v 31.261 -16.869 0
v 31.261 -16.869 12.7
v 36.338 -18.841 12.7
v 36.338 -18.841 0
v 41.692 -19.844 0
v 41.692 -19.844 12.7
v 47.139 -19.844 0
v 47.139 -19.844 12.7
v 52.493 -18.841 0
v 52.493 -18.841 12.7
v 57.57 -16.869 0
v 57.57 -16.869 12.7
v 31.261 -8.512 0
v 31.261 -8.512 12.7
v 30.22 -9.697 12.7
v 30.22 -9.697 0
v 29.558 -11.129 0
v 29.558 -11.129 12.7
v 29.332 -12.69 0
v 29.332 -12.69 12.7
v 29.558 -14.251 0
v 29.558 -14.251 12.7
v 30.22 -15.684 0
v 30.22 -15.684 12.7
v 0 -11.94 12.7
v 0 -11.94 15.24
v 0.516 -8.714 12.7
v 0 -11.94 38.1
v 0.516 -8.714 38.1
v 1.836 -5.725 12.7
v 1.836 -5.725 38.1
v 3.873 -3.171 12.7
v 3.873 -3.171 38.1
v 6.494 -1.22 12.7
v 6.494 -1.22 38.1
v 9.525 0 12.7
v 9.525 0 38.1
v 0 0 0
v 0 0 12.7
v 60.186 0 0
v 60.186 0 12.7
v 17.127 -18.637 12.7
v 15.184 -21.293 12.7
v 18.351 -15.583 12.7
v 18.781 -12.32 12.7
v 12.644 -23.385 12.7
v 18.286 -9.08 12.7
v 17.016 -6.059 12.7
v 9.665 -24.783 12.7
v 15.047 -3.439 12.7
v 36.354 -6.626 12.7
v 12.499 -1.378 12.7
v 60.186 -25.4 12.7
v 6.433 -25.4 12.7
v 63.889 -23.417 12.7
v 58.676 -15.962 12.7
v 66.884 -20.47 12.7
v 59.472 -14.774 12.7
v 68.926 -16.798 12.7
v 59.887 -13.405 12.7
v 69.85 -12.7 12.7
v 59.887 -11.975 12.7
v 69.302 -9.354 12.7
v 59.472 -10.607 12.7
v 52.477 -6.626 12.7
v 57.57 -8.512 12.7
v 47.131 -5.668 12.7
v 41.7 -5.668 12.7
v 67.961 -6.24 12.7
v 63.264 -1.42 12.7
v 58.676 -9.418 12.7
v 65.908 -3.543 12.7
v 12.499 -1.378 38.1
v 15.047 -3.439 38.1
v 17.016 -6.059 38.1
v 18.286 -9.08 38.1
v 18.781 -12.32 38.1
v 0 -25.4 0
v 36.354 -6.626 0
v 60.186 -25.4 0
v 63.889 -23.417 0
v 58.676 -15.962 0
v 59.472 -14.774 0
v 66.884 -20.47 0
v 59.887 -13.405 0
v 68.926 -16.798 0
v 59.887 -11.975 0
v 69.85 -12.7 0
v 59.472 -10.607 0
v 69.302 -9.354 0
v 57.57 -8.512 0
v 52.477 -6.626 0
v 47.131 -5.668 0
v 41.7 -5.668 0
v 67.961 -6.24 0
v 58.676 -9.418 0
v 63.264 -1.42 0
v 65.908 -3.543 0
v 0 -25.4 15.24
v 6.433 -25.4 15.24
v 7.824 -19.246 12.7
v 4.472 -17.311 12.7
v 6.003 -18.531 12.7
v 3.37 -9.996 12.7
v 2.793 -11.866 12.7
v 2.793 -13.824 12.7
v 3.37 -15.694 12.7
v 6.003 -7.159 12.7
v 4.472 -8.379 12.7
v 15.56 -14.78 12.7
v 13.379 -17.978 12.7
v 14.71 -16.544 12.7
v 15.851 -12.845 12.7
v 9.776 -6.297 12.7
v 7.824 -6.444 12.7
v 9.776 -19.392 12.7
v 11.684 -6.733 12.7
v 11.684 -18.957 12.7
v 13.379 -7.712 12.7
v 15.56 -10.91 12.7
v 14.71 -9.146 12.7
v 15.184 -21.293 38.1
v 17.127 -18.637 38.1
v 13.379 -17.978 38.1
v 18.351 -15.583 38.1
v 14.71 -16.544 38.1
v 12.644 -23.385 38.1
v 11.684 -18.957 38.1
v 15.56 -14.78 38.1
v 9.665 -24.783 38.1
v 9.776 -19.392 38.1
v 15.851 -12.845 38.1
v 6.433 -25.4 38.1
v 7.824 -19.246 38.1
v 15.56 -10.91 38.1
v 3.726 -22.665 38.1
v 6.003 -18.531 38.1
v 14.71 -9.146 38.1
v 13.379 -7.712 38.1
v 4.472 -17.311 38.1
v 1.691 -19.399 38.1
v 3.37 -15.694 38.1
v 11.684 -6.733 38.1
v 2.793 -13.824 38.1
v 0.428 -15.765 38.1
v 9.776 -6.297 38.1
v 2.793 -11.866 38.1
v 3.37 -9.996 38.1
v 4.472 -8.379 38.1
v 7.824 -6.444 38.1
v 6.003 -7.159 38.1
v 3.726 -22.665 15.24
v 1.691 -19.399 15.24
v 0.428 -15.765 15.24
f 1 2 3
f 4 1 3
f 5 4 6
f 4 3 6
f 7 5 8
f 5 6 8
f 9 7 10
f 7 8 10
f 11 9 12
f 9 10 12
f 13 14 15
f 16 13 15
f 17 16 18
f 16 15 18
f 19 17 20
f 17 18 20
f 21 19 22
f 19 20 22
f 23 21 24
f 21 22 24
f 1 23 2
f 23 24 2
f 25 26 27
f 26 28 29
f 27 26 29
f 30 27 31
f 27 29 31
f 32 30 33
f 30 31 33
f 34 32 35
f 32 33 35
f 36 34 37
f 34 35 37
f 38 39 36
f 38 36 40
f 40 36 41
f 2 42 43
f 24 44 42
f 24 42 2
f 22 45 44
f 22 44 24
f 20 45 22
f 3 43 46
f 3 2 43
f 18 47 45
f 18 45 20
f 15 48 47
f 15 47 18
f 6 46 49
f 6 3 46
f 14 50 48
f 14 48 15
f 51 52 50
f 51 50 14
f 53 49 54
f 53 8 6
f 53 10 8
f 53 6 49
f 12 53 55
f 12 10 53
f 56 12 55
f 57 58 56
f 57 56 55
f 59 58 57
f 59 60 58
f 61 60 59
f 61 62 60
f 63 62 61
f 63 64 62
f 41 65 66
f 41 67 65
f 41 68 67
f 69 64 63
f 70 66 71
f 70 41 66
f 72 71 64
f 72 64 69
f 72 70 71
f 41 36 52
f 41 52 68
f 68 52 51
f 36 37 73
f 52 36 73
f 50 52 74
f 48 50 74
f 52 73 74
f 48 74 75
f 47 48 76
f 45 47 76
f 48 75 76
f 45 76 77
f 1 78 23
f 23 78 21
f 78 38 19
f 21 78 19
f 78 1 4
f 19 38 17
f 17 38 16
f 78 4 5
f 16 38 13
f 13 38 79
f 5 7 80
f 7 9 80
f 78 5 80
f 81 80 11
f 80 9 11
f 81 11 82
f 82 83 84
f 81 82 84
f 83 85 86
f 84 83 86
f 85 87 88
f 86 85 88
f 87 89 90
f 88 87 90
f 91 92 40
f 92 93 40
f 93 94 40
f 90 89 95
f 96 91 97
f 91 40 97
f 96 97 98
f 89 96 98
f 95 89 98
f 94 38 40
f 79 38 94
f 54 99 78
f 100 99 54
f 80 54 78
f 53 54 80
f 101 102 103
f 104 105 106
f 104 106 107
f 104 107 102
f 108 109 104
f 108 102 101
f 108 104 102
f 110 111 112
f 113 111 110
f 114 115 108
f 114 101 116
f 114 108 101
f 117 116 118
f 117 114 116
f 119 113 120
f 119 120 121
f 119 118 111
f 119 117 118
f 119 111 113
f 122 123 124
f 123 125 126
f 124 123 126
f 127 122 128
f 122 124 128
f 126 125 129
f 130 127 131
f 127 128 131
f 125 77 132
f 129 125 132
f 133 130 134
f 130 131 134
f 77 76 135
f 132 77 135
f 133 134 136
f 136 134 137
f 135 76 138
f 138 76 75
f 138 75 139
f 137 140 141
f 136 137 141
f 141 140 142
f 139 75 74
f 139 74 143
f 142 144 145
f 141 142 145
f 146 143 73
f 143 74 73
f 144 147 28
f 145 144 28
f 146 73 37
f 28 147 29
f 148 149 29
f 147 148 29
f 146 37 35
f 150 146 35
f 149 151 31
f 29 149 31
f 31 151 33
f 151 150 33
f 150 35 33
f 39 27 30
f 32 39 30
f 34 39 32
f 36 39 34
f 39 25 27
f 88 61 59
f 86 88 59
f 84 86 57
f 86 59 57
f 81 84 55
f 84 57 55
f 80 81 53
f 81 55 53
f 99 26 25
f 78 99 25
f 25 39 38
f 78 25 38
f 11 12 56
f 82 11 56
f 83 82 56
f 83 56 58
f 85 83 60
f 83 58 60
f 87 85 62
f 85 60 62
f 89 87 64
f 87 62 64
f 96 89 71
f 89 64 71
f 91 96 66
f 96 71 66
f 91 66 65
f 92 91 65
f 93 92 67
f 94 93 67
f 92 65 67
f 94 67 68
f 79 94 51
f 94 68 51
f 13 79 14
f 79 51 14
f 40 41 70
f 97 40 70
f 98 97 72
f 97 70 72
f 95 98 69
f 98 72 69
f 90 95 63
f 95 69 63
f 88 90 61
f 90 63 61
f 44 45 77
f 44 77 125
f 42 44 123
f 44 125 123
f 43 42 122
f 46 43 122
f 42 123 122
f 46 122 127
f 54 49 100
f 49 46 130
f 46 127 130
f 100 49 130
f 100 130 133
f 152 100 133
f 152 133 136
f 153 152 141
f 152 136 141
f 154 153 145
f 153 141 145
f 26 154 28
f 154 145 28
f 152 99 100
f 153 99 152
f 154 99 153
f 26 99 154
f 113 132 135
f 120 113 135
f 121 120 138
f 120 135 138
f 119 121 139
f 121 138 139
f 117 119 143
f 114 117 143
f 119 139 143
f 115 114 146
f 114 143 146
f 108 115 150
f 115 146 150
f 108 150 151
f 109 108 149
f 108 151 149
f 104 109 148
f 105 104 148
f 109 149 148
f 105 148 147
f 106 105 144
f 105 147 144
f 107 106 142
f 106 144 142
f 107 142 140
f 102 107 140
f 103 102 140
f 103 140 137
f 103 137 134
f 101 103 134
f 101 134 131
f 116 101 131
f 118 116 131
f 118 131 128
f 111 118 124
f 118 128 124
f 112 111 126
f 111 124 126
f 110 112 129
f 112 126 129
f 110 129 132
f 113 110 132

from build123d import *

# Parameters (mm, degrees)
F1_DEPTH  = 25.4
F3_DEPTH  = 25.4
F5_DEPTH  = 25.4
F6_R      = 6.5658374439
F7_DEPTH  = 25.4
F9_DEPTH  = 25.4
F11_DEPTH = 25.4
F13_DEPTH = 22.86


with BuildPart() as f1:
    # F0 (on Front) → F1 (new body)
    with BuildSketch(Plane.XZ):
        Polygon((0, 38.1), (0, 0), (69.85, 0), (69.85, 12.7), (19.05, 12.7), (19.05, 38.1), align=None)
    extrude(amount=F1_DEPTH)

    # F2 (on face) → F3 (cut)
    with BuildSketch(Plane.XY.offset(12.7)):
        with BuildLine():
            ThreePointArc((60.1857788861, 0), (67.0169340084, -4.8288024649), (69.85, -12.7))
            Line((69.85, -12.7), (69.85, 0))
            Line((69.85, 0), (60.1857788861, 0))
        make_face()
        with BuildLine():
            ThreePointArc((69.85, -12.7), (66.883728808, -20.4698334005), (60.1857788861, -25.4))
            Line((60.1857788861, -25.4), (69.85, -25.4))
            Line((69.85, -25.4), (69.85, -12.7))
        make_face()
    extrude(amount=-F3_DEPTH, mode=Mode.SUBTRACT)

    # F4 (on face) → F5 (cut)
    with BuildSketch(Plane.XY.offset(12.7)):
        with BuildLine():
            ThreePointArc((57.5700551271, -8.5117025301), (44.4156061858, -5.5470740223), (31.2611572444, -8.5117025301))
            ThreePointArc((31.2611572444, -8.5117025301), (29.3315874922, -12.6901739277), (31.2611572444, -16.8686453253))
            ThreePointArc((31.2611572444, -16.8686453253), (44.4156061858, -19.9707261196), (57.5700551271, -16.8686453253))
            ThreePointArc((57.5700551271, -16.8686453253), (59.9401679074, -12.6901739277), (57.5700551271, -8.5117025301))
        make_face()
    extrude(amount=-F5_DEPTH, mode=Mode.SUBTRACT)

    # F6 (on face) → F7 (cut)
    with BuildSketch(Plane.XY.offset(38.1)):
        with Locations((9.2854928225, -12.8449322656)):
            Circle(F6_R)
    extrude(amount=-F7_DEPTH, mode=Mode.SUBTRACT)

    # F8 (on face) → F9 (cut)
    with BuildSketch(Plane.XY.offset(38.1)):
        with BuildLine():
            ThreePointArc((9.525, 0), (18.786715691, -12.7), (9.525, -25.4))
            Line((9.525, -25.4), (19.05, -25.4))
            Line((19.05, -25.4), (19.05, 0))
            Line((19.05, 0), (9.525, 0))
        make_face()
    extrude(amount=-F9_DEPTH, mode=Mode.SUBTRACT)

    # F10 (on face) → F11 (cut)
    with BuildSketch(Plane.XY.offset(38.1)):
        with BuildLine():
            ThreePointArc((0, -11.9404586196), (2.7724235634, -4.3827293098), (9.525, 0))
            Line((9.525, 0), (0, 0))
            Line((0, 0), (0, -11.9404586196))
        make_face()
        with BuildLine():
            ThreePointArc((9.525, -25.4), (16.3361598408, -20.4049868588), (18.7813081047, -12.3202293098))
            ThreePointArc((18.7813081047, -12.3202293098), (15.1842035357, -21.293169718), (6.4328170235, -25.4))
            Line((6.4328170235, -25.4), (9.525, -25.4))
        make_face()
    extrude(amount=-F11_DEPTH, mode=Mode.SUBTRACT)

    # F12 (on face) → F13 (cut)
    with BuildSketch(Plane.XY.offset(38.1)):
        with BuildLine():
            ThreePointArc((6.4328170235, -25.4), (1.6908462088, -19.3993524556), (0, -11.9404586196))
            Line((0, -11.9404586196), (0, -25.4))
            Line((0, -25.4), (6.4328170235, -25.4))
        make_face()
    extrude(amount=-F13_DEPTH, mode=Mode.SUBTRACT)


solid = f1.part
